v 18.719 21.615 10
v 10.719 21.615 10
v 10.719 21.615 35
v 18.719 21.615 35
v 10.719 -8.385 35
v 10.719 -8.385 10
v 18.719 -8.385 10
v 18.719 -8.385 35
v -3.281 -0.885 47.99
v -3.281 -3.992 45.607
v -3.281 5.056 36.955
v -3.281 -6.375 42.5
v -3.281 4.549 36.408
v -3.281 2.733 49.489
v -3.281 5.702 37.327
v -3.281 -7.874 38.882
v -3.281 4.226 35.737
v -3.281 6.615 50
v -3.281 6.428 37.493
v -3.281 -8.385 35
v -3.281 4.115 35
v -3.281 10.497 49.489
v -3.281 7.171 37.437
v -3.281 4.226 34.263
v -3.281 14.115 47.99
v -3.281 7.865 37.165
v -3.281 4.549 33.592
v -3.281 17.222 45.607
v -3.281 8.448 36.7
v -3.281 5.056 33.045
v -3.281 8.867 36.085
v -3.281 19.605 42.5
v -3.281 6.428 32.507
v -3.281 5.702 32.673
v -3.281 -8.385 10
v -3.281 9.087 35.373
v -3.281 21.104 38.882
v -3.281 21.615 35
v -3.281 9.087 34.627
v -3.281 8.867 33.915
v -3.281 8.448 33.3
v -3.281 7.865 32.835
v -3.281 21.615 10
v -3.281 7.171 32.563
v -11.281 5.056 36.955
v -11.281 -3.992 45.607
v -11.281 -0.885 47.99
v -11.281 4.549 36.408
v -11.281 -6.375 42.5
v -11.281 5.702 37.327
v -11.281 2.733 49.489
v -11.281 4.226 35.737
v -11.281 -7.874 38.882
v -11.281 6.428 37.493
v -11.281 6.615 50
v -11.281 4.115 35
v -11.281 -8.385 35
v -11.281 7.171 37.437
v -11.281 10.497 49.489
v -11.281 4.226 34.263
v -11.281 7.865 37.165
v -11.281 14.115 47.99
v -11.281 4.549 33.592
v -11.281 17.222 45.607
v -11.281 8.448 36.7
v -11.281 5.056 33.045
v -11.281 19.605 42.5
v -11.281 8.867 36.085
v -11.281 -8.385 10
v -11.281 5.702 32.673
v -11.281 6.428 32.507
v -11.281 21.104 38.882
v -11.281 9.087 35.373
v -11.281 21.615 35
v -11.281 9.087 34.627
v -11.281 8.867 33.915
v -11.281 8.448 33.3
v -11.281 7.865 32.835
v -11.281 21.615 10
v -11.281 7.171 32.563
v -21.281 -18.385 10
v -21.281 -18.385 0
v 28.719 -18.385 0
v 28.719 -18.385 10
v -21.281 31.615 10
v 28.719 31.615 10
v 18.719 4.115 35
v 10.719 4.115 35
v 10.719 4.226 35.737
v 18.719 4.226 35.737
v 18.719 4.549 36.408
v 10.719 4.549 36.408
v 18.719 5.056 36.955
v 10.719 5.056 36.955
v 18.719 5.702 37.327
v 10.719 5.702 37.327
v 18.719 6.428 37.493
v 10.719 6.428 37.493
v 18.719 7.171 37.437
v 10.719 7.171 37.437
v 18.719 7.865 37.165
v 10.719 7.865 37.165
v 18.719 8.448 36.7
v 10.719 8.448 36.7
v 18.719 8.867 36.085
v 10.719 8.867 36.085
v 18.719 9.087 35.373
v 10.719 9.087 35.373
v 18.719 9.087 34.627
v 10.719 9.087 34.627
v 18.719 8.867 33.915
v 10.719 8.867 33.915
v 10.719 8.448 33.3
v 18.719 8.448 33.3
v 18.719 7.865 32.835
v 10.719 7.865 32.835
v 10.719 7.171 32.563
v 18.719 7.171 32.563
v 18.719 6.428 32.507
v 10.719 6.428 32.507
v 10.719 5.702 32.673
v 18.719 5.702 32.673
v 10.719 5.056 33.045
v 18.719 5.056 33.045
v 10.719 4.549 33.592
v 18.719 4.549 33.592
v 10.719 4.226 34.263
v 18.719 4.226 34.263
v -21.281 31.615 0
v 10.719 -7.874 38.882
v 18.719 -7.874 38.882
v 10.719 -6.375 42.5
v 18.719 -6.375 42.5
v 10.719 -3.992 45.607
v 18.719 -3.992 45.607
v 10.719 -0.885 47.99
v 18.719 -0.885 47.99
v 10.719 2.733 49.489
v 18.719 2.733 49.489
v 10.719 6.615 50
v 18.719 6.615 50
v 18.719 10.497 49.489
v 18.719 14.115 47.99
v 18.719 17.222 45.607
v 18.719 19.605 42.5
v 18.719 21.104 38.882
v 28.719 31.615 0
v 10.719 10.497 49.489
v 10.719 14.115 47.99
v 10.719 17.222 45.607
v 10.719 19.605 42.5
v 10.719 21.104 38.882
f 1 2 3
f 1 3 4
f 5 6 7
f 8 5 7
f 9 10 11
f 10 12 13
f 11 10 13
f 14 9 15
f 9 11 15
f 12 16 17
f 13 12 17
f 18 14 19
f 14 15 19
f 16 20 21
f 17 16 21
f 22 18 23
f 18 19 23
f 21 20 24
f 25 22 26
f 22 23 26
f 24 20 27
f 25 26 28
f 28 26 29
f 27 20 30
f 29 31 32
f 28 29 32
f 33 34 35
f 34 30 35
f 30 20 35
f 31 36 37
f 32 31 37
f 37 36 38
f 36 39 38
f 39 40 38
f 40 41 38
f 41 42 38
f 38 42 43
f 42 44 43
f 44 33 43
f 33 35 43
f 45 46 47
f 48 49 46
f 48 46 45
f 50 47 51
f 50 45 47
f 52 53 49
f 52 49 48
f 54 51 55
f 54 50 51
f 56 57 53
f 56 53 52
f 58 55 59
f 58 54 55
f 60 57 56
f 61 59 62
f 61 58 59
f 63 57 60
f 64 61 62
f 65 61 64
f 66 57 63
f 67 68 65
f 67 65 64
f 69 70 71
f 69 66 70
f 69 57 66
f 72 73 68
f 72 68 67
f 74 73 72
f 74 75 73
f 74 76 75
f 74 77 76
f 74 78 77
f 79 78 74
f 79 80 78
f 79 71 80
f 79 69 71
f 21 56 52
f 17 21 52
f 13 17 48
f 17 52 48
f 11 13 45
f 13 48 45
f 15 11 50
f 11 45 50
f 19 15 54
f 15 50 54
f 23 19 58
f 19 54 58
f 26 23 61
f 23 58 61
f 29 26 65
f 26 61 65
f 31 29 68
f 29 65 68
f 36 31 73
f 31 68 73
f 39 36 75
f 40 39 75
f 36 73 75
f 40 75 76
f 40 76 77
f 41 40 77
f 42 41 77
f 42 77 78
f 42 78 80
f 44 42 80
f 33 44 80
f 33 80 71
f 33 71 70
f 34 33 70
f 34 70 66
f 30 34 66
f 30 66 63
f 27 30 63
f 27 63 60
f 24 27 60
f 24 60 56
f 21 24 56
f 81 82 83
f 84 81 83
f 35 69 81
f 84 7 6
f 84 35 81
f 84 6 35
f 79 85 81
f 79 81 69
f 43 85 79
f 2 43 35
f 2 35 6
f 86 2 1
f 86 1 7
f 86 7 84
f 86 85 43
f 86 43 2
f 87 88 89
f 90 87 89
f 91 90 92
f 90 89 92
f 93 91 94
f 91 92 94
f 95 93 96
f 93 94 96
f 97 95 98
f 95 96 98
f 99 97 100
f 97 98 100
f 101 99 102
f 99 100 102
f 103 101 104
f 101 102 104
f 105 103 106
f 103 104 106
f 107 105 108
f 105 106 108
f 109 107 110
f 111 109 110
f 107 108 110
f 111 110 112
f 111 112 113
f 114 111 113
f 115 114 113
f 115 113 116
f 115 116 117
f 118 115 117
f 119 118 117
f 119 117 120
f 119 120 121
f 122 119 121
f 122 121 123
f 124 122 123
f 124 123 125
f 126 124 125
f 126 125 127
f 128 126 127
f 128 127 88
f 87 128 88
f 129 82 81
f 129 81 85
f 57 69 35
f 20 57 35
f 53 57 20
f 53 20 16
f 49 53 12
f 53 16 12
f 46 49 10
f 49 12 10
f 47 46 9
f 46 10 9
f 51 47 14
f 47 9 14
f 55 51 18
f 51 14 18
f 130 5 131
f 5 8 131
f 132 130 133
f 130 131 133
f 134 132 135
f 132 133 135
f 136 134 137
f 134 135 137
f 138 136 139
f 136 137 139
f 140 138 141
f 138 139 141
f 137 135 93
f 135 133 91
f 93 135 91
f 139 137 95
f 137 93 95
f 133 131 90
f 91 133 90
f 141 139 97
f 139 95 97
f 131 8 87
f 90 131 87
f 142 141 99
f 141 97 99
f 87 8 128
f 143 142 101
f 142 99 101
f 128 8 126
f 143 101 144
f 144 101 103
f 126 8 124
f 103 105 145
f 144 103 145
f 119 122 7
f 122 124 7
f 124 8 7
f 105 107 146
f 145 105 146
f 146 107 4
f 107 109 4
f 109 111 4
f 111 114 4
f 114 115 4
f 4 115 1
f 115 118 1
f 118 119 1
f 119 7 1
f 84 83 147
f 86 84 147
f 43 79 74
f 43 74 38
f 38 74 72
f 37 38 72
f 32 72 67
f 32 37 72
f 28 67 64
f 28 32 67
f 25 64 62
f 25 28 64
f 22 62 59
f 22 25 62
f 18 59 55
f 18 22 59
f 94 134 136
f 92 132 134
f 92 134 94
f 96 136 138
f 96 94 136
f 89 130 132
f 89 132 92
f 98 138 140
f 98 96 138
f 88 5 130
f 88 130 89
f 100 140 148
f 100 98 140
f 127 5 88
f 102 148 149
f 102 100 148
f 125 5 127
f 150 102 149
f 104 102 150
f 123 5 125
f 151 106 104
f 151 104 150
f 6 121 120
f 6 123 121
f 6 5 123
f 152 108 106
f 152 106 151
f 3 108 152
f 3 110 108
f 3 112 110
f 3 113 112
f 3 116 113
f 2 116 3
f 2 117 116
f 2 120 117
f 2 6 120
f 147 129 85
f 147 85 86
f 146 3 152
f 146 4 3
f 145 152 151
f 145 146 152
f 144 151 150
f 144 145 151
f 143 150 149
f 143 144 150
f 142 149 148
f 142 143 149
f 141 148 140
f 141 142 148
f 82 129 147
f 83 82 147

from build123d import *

# Parameters (mm, degrees)
F0_W     = 50
F0_H     = 50
F1_DEPTH = 10
F2_W     = 8
F2_H     = 30
F3_DEPTH = 40
F4_R     = 14.99999
F6_D     = 5


# Not quite as in the source:
# - a fillet or chamfer is up to 0.001 mm smaller than in the source, because OpenCascade refuses the exact size


with BuildPart() as f1:
    # F0 (on Top) → F1 (new body)
    with BuildSketch(Plane.XY):
        with Locations((3.7194620818, 6.6150704944)):
            Rectangle(F0_W, F0_H)
    extrude(amount=F1_DEPTH)

    # F2 (on face) → F3 (join)
    with BuildSketch(Plane.XY.offset(10)):
        with Locations((-7.2805379182, 6.6150704944)):
            Rectangle(F2_W, F2_H)
        with Locations((14.7194620818, 6.6150704944)):
            Rectangle(F2_W, F2_H)
    extrude(amount=F3_DEPTH)

    # F4 (radius 15 in the source; OpenCascade refuses exactly that, so slightly less here)
    f4_edges = [f1.edges().sort_by_distance(p)[0] for p in [
        (-7.280538, -8.38493, 50),
        (-7.280538, 21.61507, 50),
        (14.719462, -8.38493, 50),
        (14.719462, 21.61507, 50),
    ]]
    fillet(f4_edges, radius=F4_R)

    # F6 (through all)
    with Locations(Plane.YZ.offset(18.7194620818)):
        with Locations((6.6150704944, 35)):
            Hole(F6_D / 2)


solid = f1.part
